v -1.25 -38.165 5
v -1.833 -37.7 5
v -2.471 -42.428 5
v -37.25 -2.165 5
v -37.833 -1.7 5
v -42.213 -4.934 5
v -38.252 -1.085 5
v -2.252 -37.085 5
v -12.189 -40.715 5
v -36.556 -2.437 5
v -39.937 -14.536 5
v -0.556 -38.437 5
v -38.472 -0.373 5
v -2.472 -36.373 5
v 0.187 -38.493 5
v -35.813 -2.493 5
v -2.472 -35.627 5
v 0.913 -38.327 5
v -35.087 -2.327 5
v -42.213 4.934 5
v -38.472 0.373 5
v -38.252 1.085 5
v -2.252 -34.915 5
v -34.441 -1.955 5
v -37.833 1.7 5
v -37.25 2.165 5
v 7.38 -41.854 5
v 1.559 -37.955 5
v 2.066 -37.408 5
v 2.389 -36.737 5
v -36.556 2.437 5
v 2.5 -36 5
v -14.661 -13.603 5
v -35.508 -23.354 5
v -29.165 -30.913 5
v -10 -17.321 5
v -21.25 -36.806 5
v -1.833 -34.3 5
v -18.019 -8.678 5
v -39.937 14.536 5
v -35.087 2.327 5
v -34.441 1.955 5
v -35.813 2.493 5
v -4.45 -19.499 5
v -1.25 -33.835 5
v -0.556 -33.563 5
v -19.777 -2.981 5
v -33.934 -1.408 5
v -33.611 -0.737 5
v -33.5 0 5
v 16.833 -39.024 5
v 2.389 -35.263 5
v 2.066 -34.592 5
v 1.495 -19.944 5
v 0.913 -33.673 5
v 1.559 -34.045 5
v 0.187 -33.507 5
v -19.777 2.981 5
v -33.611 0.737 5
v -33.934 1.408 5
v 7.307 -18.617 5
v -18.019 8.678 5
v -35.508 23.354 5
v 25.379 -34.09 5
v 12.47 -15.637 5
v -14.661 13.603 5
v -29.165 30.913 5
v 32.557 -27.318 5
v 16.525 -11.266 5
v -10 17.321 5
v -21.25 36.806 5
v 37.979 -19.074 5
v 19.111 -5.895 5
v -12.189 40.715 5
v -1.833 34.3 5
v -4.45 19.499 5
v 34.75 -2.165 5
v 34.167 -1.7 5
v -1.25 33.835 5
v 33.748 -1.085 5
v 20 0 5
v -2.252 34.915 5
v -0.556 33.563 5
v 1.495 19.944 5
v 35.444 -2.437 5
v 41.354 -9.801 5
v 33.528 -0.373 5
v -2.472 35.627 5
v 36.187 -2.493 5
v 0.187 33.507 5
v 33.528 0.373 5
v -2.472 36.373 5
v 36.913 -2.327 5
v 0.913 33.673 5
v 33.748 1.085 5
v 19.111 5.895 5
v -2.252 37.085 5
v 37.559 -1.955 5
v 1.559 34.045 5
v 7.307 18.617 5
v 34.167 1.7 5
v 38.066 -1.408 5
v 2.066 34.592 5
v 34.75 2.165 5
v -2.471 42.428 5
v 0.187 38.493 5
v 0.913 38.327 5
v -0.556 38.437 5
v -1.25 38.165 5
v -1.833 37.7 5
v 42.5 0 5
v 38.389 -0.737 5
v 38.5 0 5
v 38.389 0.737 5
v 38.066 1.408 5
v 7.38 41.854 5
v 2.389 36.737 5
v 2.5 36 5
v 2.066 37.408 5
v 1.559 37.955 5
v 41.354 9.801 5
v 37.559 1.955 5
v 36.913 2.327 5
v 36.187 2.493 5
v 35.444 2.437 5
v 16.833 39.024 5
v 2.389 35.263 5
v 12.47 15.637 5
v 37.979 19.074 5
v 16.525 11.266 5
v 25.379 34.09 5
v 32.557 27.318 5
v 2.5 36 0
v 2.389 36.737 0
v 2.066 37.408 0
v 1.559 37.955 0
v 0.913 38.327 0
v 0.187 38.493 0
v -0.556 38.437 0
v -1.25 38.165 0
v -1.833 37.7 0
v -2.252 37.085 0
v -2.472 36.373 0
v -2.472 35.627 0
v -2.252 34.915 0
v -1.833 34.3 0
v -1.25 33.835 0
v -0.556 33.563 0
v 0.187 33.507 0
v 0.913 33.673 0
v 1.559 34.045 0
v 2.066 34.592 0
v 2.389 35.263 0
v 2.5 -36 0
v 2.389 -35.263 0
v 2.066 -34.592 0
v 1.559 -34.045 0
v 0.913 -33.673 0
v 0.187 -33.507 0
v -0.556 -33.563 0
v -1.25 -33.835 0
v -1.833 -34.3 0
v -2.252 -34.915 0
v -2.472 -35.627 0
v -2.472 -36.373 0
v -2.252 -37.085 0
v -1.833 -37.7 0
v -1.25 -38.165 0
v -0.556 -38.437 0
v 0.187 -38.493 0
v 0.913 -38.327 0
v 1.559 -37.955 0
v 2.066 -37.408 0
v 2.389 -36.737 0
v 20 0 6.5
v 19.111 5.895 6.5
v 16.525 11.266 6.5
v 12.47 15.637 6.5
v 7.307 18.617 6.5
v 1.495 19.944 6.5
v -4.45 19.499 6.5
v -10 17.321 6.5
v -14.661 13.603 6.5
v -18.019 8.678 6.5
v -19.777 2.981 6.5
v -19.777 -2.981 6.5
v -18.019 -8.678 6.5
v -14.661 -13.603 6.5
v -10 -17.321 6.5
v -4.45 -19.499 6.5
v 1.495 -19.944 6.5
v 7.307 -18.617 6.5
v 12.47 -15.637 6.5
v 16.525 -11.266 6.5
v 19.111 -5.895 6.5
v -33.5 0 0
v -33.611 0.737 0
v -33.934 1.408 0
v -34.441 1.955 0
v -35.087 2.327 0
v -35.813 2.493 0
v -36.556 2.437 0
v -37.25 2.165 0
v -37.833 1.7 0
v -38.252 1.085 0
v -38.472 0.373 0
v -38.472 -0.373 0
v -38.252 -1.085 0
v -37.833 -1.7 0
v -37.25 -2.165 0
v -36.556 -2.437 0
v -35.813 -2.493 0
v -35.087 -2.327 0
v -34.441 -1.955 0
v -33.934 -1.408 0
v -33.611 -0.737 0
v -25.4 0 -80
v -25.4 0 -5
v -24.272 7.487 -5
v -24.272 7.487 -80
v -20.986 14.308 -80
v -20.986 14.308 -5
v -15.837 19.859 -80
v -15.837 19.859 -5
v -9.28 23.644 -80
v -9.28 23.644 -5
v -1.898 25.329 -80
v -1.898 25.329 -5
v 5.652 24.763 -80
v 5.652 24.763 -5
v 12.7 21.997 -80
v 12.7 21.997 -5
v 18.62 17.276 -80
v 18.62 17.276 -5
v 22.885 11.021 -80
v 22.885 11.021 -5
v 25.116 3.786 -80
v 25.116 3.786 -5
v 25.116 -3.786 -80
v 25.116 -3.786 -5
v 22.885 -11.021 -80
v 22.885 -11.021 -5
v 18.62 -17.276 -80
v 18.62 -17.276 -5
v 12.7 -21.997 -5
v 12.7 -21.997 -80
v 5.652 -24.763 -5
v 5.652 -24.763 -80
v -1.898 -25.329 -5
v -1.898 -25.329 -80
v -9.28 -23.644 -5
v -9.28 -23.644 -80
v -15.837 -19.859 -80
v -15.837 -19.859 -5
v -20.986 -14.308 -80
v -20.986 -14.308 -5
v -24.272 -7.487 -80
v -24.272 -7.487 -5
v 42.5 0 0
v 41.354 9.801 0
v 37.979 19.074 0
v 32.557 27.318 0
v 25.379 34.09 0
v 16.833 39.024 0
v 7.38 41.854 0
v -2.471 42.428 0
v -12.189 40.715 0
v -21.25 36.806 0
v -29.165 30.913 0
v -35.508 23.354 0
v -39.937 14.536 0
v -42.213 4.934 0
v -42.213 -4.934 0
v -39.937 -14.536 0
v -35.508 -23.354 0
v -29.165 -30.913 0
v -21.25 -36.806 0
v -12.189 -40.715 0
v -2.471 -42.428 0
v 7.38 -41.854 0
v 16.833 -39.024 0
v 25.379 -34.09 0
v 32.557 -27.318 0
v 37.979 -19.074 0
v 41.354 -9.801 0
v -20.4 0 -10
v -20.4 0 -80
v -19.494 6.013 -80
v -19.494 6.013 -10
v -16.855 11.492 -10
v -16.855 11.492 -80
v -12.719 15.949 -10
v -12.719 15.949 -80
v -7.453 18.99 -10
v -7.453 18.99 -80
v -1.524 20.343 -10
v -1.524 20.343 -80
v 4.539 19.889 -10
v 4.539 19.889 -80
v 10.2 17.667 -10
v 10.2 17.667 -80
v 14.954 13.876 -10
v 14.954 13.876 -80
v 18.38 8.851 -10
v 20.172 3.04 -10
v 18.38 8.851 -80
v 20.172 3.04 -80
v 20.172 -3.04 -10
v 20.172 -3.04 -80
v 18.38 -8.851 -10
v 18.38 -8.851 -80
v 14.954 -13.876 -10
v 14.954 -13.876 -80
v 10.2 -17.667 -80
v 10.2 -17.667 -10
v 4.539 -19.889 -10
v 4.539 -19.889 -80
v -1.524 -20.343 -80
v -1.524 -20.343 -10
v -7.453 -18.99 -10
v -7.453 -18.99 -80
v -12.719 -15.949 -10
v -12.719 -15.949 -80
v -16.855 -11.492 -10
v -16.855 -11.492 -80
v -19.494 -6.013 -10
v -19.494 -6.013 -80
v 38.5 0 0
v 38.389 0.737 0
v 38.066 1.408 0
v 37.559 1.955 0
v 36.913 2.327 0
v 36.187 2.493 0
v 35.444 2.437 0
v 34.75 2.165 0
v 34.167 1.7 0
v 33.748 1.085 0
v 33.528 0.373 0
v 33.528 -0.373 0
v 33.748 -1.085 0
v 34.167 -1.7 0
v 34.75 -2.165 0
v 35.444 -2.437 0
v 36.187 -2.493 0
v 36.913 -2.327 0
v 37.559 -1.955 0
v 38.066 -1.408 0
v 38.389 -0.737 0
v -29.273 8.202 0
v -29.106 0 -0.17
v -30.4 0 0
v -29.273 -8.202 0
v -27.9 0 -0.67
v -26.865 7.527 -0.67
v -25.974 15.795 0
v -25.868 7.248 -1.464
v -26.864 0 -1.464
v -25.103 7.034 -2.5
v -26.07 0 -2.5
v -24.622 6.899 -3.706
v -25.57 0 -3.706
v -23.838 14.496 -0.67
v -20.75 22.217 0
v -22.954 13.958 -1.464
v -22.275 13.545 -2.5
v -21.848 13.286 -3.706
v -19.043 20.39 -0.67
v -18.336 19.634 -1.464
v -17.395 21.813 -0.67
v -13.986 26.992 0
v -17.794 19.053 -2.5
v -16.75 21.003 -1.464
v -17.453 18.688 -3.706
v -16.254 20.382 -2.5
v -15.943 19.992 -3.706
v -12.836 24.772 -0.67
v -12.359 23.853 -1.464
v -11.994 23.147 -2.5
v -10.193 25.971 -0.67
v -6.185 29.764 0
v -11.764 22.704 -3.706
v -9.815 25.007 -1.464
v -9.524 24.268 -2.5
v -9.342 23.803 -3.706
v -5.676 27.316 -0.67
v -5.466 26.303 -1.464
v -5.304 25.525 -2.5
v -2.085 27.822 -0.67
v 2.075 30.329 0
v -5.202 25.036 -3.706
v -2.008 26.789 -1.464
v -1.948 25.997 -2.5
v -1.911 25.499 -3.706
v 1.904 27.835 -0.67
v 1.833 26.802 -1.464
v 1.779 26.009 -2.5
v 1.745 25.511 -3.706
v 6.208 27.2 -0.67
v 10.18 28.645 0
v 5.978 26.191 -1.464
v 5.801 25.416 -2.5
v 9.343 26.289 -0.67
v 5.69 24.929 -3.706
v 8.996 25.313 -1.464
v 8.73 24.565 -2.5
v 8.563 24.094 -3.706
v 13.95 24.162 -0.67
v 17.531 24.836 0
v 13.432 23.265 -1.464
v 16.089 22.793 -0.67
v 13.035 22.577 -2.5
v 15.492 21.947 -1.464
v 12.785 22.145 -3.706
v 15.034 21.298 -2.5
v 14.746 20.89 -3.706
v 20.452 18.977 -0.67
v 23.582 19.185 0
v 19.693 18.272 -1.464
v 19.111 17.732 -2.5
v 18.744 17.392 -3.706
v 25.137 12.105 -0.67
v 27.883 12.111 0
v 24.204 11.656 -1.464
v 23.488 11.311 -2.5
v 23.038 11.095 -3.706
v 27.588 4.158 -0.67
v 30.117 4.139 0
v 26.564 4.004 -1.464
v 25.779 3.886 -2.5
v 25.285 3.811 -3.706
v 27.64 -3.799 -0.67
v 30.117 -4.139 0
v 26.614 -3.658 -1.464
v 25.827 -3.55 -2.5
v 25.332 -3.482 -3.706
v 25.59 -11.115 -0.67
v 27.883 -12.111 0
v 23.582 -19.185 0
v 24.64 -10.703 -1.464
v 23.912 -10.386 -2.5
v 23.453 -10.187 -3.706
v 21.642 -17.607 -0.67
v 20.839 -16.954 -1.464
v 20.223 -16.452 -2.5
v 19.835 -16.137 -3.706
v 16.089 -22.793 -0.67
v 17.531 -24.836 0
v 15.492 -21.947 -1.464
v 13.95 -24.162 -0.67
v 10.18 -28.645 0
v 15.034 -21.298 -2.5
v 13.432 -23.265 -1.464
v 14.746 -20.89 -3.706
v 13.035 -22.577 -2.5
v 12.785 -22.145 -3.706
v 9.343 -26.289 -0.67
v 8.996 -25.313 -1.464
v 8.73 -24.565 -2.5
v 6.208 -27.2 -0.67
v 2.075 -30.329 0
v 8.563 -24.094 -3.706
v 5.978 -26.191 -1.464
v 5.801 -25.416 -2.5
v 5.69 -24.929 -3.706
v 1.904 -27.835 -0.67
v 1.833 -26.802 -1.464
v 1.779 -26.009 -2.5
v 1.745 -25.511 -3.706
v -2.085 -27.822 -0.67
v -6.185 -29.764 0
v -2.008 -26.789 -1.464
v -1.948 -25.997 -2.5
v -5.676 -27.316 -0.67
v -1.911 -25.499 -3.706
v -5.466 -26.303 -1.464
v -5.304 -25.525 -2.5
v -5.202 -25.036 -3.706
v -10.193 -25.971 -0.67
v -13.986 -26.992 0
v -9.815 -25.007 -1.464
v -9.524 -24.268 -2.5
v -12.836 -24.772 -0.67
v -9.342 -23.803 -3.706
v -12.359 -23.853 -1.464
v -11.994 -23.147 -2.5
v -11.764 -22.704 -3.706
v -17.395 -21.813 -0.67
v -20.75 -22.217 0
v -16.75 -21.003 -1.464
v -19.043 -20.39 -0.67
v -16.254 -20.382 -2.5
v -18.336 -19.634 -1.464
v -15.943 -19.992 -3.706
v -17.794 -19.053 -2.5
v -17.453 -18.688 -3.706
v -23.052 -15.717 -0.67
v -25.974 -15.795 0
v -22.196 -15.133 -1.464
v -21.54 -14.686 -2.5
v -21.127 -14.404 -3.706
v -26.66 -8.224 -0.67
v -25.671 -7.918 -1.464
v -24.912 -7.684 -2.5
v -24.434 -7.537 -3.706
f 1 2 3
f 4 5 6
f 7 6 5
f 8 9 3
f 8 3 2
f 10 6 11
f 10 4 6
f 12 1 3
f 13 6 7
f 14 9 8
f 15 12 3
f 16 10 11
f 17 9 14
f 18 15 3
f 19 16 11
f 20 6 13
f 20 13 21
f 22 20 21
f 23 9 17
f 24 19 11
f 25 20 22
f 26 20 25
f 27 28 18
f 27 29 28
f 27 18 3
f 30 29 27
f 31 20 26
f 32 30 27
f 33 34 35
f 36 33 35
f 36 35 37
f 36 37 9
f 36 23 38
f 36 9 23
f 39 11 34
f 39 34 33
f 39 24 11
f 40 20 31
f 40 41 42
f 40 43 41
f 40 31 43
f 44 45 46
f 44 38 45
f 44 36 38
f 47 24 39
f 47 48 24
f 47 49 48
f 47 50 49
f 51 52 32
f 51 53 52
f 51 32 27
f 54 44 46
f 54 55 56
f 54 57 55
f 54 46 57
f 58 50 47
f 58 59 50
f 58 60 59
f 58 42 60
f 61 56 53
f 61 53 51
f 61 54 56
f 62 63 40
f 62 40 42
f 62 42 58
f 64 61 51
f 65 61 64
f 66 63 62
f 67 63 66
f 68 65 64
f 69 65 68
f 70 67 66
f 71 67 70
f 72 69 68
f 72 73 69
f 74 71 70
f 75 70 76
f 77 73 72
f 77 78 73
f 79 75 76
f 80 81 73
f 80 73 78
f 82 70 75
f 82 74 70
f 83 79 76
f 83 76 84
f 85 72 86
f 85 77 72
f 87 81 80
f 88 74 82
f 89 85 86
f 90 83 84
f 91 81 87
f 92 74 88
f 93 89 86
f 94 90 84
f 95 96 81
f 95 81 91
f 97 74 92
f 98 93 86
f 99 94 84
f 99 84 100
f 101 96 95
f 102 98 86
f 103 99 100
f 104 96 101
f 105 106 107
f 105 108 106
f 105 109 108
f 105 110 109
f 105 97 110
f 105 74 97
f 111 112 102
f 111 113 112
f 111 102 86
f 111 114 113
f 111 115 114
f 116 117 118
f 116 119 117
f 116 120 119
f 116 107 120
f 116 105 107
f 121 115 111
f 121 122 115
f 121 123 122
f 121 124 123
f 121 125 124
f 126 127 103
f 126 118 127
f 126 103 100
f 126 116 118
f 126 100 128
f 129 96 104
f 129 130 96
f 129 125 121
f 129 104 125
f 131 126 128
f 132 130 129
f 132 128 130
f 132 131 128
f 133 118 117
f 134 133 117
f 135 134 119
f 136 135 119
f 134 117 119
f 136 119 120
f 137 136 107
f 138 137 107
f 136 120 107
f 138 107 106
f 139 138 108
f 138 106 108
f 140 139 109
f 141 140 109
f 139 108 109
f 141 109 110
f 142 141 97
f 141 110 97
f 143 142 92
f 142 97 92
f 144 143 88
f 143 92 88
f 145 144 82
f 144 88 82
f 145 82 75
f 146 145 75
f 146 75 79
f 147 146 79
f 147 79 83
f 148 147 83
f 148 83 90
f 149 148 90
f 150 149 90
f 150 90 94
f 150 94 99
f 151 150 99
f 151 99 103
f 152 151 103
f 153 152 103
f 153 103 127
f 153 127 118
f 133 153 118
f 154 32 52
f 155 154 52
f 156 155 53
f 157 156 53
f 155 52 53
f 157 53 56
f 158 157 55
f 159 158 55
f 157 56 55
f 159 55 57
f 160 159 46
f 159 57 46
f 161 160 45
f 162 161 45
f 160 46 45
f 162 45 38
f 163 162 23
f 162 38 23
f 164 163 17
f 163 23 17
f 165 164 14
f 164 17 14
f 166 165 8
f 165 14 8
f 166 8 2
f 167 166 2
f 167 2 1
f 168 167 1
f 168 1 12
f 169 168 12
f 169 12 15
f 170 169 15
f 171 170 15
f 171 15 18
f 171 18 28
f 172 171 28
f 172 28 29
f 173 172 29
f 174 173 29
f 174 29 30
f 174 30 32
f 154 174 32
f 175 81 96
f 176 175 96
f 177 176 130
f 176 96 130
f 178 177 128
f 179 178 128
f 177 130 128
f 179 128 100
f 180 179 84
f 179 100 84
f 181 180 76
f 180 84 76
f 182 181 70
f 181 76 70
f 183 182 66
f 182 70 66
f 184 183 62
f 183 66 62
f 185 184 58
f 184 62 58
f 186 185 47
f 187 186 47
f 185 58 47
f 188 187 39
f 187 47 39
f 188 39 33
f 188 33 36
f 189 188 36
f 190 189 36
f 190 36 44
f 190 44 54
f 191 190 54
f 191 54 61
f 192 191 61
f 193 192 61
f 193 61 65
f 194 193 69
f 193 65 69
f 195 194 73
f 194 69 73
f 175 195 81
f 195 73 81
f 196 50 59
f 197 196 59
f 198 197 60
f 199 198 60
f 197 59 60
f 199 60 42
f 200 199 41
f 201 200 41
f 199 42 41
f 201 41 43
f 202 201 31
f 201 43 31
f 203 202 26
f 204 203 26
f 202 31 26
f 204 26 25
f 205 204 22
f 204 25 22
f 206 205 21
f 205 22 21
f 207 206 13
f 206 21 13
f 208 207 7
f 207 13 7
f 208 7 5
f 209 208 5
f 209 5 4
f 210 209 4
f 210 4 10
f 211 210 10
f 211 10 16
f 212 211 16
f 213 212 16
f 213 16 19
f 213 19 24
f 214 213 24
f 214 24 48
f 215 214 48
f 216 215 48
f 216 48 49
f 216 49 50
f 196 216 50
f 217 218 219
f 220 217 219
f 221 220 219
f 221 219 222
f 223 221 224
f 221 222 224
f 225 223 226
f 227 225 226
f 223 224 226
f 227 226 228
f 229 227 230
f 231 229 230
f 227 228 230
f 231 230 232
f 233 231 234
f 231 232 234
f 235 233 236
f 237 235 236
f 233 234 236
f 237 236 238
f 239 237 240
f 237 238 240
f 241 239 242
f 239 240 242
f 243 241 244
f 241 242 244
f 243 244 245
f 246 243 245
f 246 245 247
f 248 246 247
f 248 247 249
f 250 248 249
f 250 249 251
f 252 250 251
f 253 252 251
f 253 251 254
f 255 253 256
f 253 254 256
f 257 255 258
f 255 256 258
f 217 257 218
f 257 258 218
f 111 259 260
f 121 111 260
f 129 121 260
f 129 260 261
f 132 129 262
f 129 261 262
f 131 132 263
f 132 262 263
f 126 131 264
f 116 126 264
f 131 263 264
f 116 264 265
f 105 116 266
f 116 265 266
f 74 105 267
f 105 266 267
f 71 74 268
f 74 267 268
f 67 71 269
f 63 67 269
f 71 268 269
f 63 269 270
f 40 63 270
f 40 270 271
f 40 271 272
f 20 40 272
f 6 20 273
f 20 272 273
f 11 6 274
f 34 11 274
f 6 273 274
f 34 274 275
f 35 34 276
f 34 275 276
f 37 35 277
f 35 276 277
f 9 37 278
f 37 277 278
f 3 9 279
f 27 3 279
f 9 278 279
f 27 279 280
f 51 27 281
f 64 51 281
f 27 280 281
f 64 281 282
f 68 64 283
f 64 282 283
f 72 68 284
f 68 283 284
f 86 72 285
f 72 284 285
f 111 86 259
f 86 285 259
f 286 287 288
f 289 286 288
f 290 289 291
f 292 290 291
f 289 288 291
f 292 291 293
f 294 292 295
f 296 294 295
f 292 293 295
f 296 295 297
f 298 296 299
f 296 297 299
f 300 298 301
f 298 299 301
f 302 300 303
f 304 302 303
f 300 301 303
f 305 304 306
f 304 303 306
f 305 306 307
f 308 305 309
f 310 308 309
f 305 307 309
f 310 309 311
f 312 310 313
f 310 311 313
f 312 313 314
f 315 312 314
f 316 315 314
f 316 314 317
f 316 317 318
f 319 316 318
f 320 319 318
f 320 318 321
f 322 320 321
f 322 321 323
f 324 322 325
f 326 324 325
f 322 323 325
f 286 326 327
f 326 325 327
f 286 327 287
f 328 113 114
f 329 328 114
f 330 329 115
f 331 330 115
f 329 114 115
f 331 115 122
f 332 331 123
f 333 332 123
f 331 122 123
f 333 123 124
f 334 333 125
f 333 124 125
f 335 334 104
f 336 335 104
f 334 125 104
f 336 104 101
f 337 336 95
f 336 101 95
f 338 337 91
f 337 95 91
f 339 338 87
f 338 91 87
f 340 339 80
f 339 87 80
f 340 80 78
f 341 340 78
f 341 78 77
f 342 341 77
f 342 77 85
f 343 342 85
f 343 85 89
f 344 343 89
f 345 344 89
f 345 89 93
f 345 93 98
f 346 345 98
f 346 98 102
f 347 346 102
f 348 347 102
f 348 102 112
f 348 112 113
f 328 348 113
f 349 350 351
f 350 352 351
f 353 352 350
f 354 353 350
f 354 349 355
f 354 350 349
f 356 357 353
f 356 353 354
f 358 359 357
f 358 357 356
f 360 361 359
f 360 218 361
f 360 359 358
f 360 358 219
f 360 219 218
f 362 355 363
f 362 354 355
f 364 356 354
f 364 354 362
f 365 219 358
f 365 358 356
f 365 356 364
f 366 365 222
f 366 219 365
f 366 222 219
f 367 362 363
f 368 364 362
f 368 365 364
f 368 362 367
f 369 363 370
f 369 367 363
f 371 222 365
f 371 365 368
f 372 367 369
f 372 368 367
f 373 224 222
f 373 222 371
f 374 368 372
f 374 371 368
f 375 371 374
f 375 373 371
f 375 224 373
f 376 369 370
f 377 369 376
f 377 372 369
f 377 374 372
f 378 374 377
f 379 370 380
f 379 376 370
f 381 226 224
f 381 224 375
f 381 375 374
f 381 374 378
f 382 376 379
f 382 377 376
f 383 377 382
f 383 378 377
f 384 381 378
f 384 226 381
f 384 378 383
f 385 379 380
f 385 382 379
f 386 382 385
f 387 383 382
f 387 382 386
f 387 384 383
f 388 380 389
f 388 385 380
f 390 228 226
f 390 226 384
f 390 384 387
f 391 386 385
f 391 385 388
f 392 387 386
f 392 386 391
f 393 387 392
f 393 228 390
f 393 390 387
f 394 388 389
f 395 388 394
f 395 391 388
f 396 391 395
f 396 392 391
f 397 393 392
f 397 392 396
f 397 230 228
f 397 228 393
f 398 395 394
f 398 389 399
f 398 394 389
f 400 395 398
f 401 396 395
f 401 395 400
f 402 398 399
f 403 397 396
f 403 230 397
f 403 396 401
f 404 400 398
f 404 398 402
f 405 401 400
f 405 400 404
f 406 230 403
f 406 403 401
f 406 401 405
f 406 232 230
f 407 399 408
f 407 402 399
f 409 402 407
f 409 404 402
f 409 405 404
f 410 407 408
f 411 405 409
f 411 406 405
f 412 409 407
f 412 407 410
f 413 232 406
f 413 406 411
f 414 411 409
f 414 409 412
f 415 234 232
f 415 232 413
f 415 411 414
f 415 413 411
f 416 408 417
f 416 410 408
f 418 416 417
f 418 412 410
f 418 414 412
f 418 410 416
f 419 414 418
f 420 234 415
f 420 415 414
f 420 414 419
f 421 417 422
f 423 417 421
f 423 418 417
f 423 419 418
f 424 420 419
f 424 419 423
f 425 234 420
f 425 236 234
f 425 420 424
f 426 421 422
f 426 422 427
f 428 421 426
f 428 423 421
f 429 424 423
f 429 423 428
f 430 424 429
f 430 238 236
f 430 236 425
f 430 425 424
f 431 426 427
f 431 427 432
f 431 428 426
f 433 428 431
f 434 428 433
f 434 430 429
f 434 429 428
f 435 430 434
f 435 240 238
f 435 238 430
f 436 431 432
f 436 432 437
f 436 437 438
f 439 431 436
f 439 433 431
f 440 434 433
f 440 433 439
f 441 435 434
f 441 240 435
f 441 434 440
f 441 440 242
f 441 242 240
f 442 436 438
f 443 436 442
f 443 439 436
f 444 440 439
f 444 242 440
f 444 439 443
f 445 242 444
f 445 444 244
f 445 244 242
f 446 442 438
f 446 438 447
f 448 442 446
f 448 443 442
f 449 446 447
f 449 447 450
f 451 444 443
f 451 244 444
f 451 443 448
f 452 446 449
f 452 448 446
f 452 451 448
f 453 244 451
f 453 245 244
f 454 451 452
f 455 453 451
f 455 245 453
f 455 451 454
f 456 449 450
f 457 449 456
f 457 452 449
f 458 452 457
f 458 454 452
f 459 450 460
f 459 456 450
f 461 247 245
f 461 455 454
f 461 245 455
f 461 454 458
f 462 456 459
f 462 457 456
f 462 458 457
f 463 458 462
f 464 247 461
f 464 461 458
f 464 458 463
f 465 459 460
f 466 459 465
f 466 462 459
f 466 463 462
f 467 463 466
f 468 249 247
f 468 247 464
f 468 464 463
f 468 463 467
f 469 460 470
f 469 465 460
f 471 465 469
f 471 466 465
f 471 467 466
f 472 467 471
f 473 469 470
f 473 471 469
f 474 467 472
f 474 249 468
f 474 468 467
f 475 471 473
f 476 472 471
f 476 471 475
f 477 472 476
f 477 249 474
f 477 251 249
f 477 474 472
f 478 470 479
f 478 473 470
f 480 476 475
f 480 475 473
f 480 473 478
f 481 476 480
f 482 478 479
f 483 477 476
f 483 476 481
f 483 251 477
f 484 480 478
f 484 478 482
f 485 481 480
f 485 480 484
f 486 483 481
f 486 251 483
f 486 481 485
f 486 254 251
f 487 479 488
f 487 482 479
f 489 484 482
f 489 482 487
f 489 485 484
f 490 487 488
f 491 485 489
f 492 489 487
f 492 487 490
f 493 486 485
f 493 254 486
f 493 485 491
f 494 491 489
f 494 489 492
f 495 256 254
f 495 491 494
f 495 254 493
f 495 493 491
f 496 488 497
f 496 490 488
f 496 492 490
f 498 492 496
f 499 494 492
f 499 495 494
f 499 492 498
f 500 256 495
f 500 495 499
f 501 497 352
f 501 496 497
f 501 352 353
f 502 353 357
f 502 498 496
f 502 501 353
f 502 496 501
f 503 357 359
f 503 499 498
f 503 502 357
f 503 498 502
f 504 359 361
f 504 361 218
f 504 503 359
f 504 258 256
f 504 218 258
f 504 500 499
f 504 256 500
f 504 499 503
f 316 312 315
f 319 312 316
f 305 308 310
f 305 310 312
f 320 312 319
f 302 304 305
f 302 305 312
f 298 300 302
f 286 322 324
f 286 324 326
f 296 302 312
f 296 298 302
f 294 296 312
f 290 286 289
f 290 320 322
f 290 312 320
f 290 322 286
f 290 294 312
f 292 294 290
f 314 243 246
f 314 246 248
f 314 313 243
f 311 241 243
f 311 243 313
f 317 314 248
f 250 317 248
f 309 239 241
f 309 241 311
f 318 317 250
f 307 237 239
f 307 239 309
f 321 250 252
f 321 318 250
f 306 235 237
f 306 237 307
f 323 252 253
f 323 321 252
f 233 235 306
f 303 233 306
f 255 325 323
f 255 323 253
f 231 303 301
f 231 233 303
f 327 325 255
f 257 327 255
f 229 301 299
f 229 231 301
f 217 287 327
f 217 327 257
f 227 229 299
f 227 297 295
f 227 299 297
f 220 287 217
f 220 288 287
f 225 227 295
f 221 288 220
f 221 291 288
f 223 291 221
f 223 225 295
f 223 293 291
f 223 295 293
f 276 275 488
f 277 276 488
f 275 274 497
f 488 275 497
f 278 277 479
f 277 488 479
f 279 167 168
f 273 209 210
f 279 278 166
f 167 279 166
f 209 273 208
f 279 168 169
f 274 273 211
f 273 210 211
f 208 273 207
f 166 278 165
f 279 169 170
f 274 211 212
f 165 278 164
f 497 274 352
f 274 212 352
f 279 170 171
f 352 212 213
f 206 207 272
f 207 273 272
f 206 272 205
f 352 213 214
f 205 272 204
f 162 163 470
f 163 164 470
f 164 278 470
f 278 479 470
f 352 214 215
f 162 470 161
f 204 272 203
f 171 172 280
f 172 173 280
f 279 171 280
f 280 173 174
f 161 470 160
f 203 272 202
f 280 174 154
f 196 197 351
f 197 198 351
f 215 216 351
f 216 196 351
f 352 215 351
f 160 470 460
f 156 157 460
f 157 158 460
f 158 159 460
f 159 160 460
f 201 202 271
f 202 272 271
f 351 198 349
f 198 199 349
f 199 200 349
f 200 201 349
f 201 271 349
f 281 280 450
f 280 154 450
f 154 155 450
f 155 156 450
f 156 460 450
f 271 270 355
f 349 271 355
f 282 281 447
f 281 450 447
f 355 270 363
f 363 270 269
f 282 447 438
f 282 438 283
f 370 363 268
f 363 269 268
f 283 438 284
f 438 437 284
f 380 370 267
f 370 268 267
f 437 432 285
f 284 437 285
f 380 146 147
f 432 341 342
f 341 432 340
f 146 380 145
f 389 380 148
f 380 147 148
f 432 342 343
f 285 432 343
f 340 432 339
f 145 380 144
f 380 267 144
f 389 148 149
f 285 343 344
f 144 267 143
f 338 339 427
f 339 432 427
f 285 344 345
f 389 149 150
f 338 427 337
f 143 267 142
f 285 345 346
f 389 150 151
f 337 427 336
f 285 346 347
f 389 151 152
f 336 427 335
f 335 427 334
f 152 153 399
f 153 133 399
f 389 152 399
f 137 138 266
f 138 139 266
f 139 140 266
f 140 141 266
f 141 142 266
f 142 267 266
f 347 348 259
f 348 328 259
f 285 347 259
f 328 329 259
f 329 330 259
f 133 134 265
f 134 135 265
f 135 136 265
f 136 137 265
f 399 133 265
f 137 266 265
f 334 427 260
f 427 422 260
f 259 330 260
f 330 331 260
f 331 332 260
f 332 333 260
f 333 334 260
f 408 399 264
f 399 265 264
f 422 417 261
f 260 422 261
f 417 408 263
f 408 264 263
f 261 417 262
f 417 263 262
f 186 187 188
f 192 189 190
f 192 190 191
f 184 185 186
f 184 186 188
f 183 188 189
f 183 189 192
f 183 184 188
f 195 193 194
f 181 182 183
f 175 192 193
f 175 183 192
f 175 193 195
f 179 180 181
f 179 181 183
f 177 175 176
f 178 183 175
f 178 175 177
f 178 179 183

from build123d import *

# Parameters (mm, degrees)
SKETCH1_R                 = 42.5
BOSS_EXTRUDE1_DEPTH       = 5
SKETCH4_R                 = 25.4
BOSS_EXTRUDE2_DEPTH       = 80
SKETCH5_R                 = 20.4
CUT_EXTRUDE1_DEPTH        = 70
FILLET1_R                 = 5
M6X1_0_TAPPED_HOLE1_D     = 5
M6X1_0_TAPPED_HOLE1_DEPTH = 5
SKETCH8_R                 = 20
BOSS_EXTRUDE3_DEPTH       = 1.5


with BuildPart() as part:
    # Sketch1 → Boss-Extrude1 (new body)
    with BuildSketch(Plane.XY):
        Circle(SKETCH1_R)
    extrude(amount=BOSS_EXTRUDE1_DEPTH)

    # Sketch4 → Boss-Extrude2 (add)
    with BuildSketch(Plane(origin=(0, 0, 0), x_dir=(-1, 0, 0), z_dir=(0, 0, -1))):
        Circle(SKETCH4_R)
    extrude(amount=BOSS_EXTRUDE2_DEPTH)

    # Sketch5 → Cut-Extrude1 (cut)
    with BuildSketch(Plane(origin=(0, 0, -80), x_dir=(-1, 0, 0), z_dir=(0, 0, -1))):
        Circle(SKETCH5_R)
    extrude(amount=-CUT_EXTRUDE1_DEPTH, mode=Mode.SUBTRACT)

    # Fillet1
    fillet1_edges = [part.edges().sort_by_distance(p)[0] for p in [
        (25.4, 0, 0),
    ]]
    fillet(fillet1_edges, radius=FILLET1_R)

    # M6x1.0 Tapped Hole1
    with Locations(Plane(origin=(0, 0, 0), x_dir=(-1, 0, 0), z_dir=(0, 0, -1))):
        with Locations((0, 36), (36, 0), (0, -36), (-36, 0)):
            Hole(M6X1_0_TAPPED_HOLE1_D / 2, depth=M6X1_0_TAPPED_HOLE1_DEPTH)

    # Sketch8 → Boss-Extrude3 (add)
    with BuildSketch(Plane.XY.offset(5)):
        Circle(SKETCH8_R)
    extrude(amount=BOSS_EXTRUDE3_DEPTH)


solid = part.part
